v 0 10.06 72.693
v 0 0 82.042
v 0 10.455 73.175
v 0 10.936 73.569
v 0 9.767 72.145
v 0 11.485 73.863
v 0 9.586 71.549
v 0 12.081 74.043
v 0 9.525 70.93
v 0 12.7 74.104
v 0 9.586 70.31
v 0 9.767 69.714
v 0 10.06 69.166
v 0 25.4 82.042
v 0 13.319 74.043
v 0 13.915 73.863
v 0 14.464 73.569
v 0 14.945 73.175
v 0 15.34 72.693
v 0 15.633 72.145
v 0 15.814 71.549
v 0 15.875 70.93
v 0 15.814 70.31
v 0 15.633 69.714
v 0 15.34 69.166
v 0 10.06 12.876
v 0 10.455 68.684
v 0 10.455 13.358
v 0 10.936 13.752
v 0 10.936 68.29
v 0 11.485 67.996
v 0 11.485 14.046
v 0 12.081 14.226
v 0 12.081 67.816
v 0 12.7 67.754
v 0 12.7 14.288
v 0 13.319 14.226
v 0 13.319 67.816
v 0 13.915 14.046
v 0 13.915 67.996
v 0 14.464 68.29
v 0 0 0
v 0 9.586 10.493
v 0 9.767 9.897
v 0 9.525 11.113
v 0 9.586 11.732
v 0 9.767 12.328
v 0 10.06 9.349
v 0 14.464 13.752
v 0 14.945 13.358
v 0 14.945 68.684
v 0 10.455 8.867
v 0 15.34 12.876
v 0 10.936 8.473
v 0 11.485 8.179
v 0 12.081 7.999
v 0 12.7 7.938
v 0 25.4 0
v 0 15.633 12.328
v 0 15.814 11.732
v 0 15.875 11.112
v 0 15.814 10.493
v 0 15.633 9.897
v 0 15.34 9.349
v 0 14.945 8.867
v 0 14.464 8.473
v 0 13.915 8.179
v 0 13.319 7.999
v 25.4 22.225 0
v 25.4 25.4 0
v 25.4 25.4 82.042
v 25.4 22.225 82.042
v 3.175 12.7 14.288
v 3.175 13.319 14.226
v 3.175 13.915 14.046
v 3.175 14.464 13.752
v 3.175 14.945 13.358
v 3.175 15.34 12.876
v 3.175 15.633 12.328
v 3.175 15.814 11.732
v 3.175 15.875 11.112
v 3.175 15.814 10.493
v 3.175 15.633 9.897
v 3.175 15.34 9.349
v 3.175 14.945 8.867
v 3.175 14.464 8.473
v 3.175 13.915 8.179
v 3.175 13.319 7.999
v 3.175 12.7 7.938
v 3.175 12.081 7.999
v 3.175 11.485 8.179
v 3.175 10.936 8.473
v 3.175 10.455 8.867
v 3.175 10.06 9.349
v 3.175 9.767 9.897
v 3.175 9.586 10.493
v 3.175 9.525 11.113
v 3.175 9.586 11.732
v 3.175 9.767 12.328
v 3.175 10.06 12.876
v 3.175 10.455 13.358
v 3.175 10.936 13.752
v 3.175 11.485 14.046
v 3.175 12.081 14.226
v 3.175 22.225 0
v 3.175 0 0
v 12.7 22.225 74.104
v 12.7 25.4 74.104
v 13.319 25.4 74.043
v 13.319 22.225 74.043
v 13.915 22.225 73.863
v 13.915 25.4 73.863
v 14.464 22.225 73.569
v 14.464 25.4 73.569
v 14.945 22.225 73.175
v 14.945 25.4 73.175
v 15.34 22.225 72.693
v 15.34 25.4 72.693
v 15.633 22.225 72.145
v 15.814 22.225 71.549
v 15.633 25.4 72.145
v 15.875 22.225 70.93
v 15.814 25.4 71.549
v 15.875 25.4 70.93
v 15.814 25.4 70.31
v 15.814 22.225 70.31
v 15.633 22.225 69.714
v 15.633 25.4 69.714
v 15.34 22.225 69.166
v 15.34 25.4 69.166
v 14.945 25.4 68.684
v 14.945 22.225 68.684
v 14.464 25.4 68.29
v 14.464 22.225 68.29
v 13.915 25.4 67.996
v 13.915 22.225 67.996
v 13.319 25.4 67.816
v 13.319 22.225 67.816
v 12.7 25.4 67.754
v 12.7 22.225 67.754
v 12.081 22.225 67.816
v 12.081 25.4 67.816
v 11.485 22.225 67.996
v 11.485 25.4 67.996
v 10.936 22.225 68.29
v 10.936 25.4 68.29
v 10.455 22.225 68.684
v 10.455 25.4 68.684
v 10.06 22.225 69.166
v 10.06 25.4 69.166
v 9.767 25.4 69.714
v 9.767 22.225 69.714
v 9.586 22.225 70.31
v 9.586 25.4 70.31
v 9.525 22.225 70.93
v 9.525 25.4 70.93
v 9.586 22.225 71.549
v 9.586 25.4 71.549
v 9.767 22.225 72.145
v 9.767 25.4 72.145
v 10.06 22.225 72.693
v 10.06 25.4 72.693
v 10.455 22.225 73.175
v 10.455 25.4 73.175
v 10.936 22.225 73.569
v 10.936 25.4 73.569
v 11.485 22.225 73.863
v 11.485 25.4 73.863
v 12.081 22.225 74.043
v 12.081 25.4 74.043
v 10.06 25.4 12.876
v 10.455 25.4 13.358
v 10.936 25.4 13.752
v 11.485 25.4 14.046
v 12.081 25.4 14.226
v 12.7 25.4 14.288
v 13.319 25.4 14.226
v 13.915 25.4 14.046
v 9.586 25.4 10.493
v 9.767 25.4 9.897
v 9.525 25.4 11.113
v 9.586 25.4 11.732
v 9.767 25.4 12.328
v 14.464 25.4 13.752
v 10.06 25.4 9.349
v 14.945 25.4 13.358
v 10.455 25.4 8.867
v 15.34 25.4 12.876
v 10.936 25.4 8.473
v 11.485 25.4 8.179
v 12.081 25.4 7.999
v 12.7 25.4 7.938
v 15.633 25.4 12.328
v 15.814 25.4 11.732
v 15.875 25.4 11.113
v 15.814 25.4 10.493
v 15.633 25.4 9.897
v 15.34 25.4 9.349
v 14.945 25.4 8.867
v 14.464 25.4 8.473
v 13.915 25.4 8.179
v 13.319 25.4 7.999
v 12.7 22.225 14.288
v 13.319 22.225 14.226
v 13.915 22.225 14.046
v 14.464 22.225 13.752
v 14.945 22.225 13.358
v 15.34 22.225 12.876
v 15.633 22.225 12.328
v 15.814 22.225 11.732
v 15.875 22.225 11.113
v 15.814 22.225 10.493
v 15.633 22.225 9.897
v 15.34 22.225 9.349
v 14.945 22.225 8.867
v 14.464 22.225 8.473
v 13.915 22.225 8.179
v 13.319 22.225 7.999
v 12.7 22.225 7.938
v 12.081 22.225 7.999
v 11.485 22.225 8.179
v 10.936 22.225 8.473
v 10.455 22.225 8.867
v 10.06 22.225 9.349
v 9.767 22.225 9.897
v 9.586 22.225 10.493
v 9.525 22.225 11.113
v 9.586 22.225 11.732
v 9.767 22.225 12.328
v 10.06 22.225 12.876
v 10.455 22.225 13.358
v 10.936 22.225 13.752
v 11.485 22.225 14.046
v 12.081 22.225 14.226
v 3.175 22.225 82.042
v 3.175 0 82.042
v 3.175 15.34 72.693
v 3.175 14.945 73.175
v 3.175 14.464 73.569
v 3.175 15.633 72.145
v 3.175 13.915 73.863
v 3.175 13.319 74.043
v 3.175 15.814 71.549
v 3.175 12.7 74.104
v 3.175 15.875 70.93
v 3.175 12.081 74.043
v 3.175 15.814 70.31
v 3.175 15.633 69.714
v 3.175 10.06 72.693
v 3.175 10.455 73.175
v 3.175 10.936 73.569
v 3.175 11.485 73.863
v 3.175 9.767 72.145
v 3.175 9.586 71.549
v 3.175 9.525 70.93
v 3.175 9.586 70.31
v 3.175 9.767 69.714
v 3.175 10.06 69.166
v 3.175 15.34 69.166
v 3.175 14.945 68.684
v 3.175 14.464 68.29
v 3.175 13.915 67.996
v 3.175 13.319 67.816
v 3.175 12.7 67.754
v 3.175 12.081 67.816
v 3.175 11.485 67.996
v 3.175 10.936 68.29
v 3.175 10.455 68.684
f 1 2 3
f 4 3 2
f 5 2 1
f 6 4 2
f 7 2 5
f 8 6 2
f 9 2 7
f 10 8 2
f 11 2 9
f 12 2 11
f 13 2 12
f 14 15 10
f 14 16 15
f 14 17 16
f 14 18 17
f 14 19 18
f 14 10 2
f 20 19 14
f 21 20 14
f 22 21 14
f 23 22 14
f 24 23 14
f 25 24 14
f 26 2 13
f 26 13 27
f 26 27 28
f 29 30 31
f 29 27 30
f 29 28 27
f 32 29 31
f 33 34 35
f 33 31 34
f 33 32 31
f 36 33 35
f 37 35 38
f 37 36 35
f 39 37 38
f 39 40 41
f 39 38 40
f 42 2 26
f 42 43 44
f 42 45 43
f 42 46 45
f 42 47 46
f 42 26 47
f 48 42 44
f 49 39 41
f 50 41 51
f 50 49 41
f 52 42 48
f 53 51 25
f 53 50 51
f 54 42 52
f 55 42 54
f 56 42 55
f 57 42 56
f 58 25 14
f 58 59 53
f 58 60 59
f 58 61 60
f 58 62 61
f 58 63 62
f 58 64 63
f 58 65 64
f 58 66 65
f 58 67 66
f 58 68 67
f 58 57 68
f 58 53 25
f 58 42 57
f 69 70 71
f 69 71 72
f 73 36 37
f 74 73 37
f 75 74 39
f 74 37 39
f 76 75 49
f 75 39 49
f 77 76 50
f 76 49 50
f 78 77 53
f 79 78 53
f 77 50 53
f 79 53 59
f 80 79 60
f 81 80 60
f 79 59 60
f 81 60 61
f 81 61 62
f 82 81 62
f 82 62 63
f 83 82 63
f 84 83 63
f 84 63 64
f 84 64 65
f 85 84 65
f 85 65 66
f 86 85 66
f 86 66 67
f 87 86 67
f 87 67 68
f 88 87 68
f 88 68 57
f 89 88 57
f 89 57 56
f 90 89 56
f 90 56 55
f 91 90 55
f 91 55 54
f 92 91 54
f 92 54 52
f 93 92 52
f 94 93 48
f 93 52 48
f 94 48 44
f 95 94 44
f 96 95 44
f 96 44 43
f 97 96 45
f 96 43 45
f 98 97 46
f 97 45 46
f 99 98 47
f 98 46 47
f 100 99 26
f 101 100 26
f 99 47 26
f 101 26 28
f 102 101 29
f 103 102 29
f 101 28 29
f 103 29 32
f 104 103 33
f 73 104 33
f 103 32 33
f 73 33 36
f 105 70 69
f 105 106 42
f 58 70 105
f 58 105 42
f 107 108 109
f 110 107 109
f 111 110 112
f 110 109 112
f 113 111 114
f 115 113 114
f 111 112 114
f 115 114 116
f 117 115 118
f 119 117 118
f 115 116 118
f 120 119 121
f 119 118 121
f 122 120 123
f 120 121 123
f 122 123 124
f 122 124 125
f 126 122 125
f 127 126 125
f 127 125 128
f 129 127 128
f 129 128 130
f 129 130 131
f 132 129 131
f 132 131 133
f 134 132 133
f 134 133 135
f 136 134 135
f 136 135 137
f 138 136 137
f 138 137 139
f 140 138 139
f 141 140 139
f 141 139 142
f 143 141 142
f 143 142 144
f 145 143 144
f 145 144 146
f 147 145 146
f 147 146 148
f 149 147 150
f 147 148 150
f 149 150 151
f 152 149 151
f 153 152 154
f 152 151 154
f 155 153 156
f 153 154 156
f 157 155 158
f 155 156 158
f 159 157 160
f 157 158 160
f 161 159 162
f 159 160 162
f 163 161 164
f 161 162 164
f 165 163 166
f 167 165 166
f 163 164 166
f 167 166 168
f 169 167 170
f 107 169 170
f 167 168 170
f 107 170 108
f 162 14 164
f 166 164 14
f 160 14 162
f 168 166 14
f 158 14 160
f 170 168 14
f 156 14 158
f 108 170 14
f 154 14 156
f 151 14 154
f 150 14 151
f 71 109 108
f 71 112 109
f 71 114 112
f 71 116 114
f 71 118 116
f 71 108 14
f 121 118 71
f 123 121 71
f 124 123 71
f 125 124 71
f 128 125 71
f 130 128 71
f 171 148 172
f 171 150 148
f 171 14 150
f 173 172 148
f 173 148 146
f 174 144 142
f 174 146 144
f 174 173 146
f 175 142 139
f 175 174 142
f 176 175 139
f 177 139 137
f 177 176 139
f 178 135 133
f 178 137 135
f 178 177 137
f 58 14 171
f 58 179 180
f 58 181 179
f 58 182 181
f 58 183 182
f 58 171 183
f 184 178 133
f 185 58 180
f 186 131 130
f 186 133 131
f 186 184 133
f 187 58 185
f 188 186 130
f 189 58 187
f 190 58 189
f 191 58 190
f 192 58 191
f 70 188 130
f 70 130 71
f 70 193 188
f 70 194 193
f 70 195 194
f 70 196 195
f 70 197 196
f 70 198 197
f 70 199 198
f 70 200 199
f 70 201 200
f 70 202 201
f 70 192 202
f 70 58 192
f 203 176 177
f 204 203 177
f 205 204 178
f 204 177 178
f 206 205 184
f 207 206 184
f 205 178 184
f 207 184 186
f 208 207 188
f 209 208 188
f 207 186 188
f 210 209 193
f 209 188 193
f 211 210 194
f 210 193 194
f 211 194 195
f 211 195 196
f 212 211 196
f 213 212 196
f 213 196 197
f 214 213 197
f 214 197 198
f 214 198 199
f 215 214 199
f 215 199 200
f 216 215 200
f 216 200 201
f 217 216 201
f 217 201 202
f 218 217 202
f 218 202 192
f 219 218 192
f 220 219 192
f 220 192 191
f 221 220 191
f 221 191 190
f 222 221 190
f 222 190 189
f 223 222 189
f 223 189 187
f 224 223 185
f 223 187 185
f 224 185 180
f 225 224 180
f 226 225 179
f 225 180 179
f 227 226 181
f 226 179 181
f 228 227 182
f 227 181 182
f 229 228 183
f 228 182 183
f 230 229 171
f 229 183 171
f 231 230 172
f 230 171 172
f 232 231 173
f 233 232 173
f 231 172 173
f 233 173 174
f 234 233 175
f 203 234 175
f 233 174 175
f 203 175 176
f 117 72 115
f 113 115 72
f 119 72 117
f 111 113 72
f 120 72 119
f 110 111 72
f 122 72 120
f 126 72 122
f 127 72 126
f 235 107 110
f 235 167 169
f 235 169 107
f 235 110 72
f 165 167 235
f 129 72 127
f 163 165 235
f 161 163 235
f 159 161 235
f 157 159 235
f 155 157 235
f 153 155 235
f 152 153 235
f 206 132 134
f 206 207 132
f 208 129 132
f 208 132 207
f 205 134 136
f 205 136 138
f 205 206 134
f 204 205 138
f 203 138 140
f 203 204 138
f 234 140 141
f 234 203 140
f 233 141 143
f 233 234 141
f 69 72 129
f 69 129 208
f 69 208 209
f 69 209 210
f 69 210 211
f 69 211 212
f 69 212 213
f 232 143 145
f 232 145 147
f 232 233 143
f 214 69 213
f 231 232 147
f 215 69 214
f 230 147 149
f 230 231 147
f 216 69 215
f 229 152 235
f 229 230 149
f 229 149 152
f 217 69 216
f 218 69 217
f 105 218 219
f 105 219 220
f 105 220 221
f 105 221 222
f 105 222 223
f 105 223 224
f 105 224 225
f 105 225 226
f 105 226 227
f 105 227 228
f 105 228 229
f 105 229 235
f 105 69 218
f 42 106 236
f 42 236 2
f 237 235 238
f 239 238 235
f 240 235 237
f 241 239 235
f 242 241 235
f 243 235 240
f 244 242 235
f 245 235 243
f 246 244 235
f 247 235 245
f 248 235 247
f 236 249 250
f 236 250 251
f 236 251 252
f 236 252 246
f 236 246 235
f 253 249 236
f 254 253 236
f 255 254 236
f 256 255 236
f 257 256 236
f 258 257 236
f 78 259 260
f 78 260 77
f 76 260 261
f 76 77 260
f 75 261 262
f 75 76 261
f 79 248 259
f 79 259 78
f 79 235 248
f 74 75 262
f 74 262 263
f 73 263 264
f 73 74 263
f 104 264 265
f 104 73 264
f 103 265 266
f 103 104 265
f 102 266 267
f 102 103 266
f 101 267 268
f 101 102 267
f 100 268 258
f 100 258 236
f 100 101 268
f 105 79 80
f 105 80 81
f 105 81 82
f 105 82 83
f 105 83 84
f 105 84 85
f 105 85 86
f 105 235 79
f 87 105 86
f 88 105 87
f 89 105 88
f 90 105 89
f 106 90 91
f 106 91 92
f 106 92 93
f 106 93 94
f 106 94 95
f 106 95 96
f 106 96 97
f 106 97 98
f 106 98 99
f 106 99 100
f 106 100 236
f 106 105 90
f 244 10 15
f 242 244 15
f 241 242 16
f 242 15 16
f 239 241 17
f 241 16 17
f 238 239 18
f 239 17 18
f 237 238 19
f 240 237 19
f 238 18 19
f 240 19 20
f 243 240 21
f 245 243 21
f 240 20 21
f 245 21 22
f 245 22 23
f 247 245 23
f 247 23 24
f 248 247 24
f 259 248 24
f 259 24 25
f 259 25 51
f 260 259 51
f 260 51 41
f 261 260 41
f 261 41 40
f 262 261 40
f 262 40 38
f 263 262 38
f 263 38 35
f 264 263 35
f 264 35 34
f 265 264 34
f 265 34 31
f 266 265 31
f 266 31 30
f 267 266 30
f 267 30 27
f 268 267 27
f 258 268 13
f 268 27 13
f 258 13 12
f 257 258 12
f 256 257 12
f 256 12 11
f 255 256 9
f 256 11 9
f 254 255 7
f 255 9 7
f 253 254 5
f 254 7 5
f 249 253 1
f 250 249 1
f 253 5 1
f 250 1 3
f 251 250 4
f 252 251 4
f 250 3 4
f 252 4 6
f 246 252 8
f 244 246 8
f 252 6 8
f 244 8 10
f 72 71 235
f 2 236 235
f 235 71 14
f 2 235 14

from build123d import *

# Parameters (mm, degrees)
BOSS_EXTRUDE1_DEPTH = 82.042
SKETCH2_R           = 3.175
CUT_EXTRUDE2_DEPTH  = 82.042
SKETCH3_R           = 3.175
CUT_EXTRUDE3_DEPTH  = 82.042


with BuildPart() as part:
    # Sketch1 → Boss-Extrude1 (new body)
    with BuildSketch(Plane.XY):
        Polygon((0, 0), (0, 25.4), (25.4, 25.4), (25.4, 22.225), (3.175, 22.225), (3.175, 0), align=None)
    extrude(amount=BOSS_EXTRUDE1_DEPTH)

    # Sketch2 → Cut-Extrude2 (cut)
    with BuildSketch(Plane.ZY):
        with Locations((70.9295, 12.7)):
            Circle(SKETCH2_R)
        with Locations((11.1125, 12.7)):
            Circle(SKETCH2_R)
    extrude(amount=-CUT_EXTRUDE2_DEPTH, mode=Mode.SUBTRACT)

    # Sketch3 → Cut-Extrude3 (cut)
    with BuildSketch(Plane(origin=(0, 25.4, 0), x_dir=(1, 0, 0), z_dir=(0, 1, 0))):
        with Locations(Location((12.7, -11.1125, 0), (0, 0, 270))):
            Circle(SKETCH3_R)
        with Locations(Location((12.7, -70.9295, 0), (0, 0, 270))):
            Circle(SKETCH3_R)
    extrude(amount=-CUT_EXTRUDE3_DEPTH, mode=Mode.SUBTRACT)


solid = part.part
